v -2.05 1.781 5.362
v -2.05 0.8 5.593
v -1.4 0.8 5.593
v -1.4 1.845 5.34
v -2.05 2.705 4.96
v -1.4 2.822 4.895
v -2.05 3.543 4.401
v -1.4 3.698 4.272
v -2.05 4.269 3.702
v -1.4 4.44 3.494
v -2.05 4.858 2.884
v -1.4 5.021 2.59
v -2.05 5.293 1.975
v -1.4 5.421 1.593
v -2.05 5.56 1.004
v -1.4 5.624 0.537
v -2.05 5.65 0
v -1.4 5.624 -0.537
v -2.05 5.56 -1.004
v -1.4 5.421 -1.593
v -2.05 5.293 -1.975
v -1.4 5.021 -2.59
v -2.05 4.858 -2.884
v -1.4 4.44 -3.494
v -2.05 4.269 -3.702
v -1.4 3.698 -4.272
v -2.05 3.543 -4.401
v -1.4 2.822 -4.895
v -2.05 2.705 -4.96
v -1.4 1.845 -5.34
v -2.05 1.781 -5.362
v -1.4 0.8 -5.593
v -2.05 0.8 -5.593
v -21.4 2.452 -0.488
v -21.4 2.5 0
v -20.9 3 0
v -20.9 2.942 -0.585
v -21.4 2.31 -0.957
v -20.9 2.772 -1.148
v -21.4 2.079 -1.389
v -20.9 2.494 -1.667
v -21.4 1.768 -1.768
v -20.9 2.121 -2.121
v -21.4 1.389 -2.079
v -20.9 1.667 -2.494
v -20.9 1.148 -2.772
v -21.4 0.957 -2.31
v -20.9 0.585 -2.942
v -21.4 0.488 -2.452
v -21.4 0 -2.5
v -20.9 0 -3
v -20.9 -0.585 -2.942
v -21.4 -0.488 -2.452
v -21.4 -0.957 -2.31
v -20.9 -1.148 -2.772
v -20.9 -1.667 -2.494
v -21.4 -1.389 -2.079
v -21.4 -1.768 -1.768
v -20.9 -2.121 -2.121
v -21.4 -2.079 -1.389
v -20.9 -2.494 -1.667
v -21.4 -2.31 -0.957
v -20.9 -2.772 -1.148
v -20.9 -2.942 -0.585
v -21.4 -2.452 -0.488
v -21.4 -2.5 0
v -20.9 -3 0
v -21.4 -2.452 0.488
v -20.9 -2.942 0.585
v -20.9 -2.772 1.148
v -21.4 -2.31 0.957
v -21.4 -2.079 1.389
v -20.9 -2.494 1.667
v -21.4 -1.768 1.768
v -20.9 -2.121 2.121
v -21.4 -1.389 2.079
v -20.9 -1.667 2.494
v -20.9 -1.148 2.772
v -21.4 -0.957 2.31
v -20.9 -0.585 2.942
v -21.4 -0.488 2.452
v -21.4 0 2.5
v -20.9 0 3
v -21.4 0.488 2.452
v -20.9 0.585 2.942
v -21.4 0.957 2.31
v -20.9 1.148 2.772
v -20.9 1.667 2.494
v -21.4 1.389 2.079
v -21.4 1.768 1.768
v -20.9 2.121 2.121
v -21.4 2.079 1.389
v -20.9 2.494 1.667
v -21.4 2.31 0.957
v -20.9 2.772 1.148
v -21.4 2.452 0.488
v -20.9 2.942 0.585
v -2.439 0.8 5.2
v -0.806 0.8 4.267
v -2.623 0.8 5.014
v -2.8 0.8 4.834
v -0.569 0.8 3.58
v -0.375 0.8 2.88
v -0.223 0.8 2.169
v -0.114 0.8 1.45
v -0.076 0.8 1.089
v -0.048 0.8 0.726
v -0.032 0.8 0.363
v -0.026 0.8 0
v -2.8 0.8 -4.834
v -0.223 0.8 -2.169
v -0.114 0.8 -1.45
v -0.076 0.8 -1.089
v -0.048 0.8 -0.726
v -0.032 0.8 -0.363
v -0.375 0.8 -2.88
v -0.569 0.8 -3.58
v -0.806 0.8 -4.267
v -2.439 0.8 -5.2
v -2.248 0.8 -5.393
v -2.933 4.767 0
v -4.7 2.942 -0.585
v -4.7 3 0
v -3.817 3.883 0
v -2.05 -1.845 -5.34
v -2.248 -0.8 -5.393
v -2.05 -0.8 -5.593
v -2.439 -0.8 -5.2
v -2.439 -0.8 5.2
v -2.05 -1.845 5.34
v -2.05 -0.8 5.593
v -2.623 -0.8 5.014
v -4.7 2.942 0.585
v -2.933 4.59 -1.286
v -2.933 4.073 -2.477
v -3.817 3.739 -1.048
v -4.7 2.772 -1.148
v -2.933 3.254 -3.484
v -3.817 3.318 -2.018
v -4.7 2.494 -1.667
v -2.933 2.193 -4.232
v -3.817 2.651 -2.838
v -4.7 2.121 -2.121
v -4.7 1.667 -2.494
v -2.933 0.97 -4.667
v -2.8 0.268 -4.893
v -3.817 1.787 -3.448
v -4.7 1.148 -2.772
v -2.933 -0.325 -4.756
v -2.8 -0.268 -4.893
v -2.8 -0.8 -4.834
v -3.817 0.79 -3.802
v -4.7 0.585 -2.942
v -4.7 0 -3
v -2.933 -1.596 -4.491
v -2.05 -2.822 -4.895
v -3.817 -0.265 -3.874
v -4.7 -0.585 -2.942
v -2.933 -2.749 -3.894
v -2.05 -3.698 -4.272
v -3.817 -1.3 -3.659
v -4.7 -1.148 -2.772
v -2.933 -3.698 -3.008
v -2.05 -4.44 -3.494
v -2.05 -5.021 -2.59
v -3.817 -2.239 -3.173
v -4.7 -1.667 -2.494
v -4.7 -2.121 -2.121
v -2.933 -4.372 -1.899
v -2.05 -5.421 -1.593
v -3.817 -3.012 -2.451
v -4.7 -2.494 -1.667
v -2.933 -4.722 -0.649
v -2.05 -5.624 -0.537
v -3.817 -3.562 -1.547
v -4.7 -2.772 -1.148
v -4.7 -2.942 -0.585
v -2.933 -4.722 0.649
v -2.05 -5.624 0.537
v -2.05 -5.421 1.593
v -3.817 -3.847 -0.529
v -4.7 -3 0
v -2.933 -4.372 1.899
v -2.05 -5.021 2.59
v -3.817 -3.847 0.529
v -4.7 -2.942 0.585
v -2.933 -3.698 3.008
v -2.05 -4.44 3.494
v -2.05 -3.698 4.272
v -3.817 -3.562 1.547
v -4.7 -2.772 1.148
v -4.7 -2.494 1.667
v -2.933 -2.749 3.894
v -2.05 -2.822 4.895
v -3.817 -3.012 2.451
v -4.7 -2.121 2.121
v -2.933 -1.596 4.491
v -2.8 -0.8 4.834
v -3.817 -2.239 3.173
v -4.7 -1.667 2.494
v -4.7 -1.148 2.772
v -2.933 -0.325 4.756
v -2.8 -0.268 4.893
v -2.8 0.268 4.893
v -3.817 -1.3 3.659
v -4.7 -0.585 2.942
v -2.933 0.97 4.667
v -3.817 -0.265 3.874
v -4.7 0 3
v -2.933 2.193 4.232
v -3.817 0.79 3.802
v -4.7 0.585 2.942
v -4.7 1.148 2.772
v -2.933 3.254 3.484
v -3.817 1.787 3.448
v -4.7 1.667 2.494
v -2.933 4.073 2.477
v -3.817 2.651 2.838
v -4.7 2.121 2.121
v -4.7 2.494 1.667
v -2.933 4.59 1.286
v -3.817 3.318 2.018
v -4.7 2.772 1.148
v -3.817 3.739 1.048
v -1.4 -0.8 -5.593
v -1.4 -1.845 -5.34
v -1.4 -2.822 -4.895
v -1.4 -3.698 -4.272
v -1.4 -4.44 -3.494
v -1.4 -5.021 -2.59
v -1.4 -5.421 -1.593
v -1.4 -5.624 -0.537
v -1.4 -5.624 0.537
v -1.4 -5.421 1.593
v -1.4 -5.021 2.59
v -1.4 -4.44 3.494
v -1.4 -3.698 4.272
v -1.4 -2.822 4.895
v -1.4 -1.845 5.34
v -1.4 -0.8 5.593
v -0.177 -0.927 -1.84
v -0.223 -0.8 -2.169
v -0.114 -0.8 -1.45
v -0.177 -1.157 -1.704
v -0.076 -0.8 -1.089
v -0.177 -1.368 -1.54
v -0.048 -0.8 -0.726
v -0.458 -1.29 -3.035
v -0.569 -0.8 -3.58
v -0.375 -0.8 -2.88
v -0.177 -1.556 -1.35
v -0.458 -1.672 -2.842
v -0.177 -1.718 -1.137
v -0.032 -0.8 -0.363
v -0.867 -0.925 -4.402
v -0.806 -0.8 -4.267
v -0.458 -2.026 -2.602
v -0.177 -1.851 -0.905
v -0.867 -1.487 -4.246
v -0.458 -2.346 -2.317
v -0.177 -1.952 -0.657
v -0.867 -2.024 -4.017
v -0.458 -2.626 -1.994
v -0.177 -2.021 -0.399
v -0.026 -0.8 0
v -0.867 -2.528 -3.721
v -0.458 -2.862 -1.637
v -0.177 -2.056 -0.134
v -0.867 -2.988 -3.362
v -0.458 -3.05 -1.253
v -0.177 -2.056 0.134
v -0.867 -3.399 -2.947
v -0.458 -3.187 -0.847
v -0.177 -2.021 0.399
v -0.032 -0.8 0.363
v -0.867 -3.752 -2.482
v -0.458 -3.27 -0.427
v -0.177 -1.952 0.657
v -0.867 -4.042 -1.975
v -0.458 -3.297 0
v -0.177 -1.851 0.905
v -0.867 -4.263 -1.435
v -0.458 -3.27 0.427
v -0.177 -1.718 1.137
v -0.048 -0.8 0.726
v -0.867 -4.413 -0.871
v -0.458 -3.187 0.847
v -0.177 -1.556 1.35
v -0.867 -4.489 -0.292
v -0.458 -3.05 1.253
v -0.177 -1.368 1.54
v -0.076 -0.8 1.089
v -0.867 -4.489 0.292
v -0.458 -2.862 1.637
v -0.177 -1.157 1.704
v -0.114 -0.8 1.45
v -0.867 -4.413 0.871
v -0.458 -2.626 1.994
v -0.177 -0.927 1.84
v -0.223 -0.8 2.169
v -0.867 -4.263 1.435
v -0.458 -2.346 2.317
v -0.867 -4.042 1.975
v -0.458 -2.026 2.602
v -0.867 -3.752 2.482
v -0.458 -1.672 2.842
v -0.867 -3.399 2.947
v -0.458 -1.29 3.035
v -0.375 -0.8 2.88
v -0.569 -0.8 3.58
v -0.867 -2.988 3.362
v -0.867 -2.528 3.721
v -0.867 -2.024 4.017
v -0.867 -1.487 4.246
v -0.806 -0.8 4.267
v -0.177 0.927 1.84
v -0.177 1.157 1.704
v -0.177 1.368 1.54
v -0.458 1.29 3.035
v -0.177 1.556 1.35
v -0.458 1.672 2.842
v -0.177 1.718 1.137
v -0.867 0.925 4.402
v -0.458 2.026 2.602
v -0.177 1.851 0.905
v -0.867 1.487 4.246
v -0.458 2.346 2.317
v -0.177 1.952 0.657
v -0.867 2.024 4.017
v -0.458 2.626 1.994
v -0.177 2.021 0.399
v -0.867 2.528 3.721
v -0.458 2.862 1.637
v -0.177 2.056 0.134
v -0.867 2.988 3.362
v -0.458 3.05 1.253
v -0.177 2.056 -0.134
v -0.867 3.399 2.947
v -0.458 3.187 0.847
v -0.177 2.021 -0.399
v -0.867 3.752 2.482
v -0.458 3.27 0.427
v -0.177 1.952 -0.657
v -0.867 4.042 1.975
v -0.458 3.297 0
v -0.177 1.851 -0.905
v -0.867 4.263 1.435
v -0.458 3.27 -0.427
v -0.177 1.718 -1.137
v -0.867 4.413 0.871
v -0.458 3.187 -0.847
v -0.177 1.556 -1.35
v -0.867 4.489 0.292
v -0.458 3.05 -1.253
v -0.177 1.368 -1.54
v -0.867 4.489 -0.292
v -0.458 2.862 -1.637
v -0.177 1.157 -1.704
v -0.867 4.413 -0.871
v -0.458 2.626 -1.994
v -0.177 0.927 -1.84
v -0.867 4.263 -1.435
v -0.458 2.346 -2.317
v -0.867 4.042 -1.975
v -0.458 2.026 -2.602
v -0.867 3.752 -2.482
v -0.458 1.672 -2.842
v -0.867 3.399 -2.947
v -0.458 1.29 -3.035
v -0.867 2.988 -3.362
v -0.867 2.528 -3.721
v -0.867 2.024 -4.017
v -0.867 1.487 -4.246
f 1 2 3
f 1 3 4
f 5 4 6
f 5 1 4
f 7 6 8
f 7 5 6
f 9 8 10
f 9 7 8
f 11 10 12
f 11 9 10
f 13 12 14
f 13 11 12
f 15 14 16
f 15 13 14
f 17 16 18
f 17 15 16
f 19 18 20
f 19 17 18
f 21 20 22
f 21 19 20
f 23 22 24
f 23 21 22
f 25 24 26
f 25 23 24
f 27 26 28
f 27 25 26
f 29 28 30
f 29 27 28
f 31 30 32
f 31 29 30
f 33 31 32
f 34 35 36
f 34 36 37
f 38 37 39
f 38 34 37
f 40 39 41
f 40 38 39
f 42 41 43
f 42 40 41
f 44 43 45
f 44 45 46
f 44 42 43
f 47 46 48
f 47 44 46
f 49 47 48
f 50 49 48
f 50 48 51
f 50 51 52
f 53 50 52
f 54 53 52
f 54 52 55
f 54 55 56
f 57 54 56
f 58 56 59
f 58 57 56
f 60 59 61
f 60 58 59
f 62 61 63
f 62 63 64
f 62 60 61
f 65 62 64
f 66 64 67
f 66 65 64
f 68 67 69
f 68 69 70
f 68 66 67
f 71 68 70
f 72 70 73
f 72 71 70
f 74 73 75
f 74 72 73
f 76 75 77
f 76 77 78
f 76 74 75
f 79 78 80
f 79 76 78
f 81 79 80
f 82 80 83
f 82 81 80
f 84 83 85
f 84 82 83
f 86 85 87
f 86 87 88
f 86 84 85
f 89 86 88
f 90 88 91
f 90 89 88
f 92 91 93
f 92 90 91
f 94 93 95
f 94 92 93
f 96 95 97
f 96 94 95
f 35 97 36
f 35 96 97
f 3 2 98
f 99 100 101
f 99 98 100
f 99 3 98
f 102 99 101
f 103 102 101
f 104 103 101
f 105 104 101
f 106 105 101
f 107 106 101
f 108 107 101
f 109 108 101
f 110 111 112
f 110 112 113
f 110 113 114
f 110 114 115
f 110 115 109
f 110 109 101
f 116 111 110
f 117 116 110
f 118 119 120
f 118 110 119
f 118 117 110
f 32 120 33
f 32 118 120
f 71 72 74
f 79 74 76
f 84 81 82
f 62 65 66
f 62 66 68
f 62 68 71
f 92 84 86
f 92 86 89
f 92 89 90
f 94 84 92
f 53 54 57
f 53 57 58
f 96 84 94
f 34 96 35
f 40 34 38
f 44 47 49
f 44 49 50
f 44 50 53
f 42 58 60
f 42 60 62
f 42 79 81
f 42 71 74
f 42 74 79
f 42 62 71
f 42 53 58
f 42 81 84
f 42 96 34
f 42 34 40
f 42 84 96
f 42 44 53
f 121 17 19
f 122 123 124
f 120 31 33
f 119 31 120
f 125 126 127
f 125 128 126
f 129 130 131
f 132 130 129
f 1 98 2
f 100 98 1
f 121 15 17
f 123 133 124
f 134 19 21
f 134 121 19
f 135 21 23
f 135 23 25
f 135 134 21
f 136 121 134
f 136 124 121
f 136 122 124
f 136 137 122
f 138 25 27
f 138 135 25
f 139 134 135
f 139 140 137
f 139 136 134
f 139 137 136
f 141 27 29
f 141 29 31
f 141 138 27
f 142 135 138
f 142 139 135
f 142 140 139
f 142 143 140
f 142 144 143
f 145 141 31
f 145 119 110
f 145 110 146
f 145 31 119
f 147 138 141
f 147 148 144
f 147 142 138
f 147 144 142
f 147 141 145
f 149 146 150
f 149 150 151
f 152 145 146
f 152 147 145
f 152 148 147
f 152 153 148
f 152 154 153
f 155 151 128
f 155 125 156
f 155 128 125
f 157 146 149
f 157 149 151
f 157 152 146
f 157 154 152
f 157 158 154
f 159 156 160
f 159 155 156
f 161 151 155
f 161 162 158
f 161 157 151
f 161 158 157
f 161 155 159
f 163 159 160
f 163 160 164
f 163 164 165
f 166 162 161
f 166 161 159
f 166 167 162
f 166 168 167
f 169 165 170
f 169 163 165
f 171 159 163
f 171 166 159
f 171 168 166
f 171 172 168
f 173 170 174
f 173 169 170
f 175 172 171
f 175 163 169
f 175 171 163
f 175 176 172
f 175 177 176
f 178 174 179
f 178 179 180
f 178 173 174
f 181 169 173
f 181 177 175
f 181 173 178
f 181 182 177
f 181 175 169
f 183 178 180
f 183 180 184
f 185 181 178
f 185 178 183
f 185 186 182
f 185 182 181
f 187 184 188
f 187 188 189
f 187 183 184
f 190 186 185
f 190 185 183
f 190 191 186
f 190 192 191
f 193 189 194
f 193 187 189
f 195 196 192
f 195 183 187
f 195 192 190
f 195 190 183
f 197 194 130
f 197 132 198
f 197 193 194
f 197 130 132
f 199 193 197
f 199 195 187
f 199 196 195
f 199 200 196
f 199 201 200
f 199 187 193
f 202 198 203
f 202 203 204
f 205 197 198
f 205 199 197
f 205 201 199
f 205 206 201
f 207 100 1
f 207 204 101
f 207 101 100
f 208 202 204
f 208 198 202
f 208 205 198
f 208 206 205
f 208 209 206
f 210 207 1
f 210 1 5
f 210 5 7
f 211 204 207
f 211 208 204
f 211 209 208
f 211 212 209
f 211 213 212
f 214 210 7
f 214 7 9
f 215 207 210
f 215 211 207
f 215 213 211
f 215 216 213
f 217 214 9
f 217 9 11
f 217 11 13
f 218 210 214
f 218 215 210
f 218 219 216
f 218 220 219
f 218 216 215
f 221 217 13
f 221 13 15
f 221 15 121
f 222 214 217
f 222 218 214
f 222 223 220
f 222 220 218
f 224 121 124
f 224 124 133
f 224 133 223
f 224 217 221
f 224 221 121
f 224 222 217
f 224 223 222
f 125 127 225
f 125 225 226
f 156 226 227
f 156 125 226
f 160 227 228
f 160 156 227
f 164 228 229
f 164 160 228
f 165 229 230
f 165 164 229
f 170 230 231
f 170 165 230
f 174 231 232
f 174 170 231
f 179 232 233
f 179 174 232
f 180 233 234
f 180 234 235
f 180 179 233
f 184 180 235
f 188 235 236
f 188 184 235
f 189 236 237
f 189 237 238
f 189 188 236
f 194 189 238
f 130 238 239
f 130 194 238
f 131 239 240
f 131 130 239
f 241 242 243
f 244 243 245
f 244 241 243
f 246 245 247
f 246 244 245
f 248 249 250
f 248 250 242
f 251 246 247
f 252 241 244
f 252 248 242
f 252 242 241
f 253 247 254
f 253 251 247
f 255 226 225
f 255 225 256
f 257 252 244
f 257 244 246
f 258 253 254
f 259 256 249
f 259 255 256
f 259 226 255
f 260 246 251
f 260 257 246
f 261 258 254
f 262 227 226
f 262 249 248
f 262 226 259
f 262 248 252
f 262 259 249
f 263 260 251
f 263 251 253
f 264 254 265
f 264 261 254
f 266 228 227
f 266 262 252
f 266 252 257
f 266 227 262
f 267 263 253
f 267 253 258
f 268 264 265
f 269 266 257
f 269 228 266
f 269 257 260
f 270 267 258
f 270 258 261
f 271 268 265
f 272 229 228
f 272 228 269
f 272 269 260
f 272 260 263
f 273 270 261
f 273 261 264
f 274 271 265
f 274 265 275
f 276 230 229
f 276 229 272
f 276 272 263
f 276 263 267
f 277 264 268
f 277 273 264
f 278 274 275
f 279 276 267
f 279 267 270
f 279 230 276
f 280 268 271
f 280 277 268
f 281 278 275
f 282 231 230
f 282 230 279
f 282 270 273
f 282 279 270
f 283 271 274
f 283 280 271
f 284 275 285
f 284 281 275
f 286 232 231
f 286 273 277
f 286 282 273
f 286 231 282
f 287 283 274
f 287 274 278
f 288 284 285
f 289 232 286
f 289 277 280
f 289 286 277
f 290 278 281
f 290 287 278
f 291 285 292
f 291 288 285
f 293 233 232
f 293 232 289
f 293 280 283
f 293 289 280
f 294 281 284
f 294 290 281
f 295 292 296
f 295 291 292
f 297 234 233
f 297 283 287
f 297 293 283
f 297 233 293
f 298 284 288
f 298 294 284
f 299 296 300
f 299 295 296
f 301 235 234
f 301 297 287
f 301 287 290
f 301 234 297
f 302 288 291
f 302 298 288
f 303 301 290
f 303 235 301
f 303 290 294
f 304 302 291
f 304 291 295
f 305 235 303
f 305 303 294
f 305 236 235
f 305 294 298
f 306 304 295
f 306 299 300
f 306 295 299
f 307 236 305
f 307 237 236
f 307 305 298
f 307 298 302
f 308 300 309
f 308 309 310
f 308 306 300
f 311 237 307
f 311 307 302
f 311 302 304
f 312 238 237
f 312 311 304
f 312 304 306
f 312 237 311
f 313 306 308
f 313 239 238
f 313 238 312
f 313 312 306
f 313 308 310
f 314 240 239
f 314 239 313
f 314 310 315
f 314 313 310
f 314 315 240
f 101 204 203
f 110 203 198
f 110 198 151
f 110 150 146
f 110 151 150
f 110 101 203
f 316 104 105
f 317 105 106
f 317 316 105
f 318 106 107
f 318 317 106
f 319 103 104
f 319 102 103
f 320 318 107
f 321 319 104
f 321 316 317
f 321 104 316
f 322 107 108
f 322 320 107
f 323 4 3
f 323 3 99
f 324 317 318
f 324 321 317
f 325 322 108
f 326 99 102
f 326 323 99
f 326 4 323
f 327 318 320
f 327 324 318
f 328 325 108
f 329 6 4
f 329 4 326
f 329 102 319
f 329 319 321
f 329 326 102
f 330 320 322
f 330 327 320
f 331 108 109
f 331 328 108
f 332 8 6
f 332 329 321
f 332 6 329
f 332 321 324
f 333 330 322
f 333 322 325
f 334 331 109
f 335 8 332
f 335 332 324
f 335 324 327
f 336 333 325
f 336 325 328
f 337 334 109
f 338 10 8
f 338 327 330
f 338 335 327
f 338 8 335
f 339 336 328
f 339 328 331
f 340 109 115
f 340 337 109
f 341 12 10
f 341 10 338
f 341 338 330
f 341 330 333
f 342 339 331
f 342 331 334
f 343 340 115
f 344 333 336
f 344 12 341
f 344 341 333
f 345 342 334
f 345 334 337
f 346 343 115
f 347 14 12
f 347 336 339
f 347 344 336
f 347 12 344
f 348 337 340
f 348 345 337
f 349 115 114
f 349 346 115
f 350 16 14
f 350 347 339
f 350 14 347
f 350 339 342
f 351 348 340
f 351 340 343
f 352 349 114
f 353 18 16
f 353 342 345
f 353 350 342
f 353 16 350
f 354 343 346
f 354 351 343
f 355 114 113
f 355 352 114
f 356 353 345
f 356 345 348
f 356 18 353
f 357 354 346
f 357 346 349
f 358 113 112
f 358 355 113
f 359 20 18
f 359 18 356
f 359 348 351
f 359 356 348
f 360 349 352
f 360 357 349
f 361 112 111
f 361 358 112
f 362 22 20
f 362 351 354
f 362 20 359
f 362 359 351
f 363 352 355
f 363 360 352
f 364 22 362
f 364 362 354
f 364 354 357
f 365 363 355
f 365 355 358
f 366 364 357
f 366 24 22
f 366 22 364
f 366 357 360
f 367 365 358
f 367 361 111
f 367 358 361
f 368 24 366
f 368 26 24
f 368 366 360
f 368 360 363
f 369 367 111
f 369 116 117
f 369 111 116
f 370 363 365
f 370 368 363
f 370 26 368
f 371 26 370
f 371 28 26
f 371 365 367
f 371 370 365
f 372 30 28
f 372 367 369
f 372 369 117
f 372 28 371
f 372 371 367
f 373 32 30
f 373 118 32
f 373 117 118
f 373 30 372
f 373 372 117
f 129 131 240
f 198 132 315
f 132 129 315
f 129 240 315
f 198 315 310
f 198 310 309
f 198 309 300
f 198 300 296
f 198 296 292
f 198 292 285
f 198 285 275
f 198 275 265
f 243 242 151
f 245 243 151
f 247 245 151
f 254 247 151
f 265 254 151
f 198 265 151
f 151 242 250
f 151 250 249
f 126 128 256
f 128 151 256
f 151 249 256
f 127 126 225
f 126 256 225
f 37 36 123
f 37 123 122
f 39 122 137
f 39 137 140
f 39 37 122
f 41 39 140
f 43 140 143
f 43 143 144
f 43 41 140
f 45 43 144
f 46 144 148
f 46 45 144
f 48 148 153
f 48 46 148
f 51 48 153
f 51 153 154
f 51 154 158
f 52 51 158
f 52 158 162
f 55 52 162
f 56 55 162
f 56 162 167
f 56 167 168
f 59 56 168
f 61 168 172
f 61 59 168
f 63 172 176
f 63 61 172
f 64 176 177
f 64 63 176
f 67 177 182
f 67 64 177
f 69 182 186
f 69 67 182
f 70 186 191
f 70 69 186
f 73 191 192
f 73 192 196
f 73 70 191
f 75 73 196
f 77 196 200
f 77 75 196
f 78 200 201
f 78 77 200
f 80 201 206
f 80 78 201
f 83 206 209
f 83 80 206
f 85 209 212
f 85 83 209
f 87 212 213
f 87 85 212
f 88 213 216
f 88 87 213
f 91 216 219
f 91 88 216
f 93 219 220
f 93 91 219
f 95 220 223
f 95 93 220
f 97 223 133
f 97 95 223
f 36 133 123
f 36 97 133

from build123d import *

# Parameters (mm, degrees)
SKETCH2_W          = 11.3
SKETCH2_H          = 1.6
CUT_EXTRUDE1_DEPTH = 2.8
CHAMFER1_SIZE      = 0.5


with BuildPart() as part:
    # Sketch1 → Revolve1 (revolve)
    with BuildSketch(Plane.XY):
        with BuildLine():
            Line((-1.4, 5.65), (-2.05, 5.65))
            Line((-2.05, 5.65), (-4.7, 3))
            Line((-4.7, 3), (-21.4, 3))
            Line((-21.4, 3), (-21.4, 0))
            Line((-21.4, 0), (0, 0))
            ThreePointArc((0, 0), (-0.355213526, 2.910433816), (-1.4, 5.65))
        make_face()
    revolve(axis=Axis((0, 0, 0), (-1, 0, 0)))

    # Sketch2 → Cut-Extrude1 (cut)
    with BuildSketch(Plane(origin=(0, 0, 0), x_dir=(0, 0, -1), z_dir=(1, 0, 0))):
        Rectangle(SKETCH2_W, SKETCH2_H)
    extrude(amount=-CUT_EXTRUDE1_DEPTH, mode=Mode.SUBTRACT)

    # Chamfer1
    chamfer1_edges = [part.edges().sort_by_distance(p)[0] for p in [
        (-21.4, -3, 0),
    ]]
    chamfer(chamfer1_edges, length=CHAMFER1_SIZE)


solid = part.part
